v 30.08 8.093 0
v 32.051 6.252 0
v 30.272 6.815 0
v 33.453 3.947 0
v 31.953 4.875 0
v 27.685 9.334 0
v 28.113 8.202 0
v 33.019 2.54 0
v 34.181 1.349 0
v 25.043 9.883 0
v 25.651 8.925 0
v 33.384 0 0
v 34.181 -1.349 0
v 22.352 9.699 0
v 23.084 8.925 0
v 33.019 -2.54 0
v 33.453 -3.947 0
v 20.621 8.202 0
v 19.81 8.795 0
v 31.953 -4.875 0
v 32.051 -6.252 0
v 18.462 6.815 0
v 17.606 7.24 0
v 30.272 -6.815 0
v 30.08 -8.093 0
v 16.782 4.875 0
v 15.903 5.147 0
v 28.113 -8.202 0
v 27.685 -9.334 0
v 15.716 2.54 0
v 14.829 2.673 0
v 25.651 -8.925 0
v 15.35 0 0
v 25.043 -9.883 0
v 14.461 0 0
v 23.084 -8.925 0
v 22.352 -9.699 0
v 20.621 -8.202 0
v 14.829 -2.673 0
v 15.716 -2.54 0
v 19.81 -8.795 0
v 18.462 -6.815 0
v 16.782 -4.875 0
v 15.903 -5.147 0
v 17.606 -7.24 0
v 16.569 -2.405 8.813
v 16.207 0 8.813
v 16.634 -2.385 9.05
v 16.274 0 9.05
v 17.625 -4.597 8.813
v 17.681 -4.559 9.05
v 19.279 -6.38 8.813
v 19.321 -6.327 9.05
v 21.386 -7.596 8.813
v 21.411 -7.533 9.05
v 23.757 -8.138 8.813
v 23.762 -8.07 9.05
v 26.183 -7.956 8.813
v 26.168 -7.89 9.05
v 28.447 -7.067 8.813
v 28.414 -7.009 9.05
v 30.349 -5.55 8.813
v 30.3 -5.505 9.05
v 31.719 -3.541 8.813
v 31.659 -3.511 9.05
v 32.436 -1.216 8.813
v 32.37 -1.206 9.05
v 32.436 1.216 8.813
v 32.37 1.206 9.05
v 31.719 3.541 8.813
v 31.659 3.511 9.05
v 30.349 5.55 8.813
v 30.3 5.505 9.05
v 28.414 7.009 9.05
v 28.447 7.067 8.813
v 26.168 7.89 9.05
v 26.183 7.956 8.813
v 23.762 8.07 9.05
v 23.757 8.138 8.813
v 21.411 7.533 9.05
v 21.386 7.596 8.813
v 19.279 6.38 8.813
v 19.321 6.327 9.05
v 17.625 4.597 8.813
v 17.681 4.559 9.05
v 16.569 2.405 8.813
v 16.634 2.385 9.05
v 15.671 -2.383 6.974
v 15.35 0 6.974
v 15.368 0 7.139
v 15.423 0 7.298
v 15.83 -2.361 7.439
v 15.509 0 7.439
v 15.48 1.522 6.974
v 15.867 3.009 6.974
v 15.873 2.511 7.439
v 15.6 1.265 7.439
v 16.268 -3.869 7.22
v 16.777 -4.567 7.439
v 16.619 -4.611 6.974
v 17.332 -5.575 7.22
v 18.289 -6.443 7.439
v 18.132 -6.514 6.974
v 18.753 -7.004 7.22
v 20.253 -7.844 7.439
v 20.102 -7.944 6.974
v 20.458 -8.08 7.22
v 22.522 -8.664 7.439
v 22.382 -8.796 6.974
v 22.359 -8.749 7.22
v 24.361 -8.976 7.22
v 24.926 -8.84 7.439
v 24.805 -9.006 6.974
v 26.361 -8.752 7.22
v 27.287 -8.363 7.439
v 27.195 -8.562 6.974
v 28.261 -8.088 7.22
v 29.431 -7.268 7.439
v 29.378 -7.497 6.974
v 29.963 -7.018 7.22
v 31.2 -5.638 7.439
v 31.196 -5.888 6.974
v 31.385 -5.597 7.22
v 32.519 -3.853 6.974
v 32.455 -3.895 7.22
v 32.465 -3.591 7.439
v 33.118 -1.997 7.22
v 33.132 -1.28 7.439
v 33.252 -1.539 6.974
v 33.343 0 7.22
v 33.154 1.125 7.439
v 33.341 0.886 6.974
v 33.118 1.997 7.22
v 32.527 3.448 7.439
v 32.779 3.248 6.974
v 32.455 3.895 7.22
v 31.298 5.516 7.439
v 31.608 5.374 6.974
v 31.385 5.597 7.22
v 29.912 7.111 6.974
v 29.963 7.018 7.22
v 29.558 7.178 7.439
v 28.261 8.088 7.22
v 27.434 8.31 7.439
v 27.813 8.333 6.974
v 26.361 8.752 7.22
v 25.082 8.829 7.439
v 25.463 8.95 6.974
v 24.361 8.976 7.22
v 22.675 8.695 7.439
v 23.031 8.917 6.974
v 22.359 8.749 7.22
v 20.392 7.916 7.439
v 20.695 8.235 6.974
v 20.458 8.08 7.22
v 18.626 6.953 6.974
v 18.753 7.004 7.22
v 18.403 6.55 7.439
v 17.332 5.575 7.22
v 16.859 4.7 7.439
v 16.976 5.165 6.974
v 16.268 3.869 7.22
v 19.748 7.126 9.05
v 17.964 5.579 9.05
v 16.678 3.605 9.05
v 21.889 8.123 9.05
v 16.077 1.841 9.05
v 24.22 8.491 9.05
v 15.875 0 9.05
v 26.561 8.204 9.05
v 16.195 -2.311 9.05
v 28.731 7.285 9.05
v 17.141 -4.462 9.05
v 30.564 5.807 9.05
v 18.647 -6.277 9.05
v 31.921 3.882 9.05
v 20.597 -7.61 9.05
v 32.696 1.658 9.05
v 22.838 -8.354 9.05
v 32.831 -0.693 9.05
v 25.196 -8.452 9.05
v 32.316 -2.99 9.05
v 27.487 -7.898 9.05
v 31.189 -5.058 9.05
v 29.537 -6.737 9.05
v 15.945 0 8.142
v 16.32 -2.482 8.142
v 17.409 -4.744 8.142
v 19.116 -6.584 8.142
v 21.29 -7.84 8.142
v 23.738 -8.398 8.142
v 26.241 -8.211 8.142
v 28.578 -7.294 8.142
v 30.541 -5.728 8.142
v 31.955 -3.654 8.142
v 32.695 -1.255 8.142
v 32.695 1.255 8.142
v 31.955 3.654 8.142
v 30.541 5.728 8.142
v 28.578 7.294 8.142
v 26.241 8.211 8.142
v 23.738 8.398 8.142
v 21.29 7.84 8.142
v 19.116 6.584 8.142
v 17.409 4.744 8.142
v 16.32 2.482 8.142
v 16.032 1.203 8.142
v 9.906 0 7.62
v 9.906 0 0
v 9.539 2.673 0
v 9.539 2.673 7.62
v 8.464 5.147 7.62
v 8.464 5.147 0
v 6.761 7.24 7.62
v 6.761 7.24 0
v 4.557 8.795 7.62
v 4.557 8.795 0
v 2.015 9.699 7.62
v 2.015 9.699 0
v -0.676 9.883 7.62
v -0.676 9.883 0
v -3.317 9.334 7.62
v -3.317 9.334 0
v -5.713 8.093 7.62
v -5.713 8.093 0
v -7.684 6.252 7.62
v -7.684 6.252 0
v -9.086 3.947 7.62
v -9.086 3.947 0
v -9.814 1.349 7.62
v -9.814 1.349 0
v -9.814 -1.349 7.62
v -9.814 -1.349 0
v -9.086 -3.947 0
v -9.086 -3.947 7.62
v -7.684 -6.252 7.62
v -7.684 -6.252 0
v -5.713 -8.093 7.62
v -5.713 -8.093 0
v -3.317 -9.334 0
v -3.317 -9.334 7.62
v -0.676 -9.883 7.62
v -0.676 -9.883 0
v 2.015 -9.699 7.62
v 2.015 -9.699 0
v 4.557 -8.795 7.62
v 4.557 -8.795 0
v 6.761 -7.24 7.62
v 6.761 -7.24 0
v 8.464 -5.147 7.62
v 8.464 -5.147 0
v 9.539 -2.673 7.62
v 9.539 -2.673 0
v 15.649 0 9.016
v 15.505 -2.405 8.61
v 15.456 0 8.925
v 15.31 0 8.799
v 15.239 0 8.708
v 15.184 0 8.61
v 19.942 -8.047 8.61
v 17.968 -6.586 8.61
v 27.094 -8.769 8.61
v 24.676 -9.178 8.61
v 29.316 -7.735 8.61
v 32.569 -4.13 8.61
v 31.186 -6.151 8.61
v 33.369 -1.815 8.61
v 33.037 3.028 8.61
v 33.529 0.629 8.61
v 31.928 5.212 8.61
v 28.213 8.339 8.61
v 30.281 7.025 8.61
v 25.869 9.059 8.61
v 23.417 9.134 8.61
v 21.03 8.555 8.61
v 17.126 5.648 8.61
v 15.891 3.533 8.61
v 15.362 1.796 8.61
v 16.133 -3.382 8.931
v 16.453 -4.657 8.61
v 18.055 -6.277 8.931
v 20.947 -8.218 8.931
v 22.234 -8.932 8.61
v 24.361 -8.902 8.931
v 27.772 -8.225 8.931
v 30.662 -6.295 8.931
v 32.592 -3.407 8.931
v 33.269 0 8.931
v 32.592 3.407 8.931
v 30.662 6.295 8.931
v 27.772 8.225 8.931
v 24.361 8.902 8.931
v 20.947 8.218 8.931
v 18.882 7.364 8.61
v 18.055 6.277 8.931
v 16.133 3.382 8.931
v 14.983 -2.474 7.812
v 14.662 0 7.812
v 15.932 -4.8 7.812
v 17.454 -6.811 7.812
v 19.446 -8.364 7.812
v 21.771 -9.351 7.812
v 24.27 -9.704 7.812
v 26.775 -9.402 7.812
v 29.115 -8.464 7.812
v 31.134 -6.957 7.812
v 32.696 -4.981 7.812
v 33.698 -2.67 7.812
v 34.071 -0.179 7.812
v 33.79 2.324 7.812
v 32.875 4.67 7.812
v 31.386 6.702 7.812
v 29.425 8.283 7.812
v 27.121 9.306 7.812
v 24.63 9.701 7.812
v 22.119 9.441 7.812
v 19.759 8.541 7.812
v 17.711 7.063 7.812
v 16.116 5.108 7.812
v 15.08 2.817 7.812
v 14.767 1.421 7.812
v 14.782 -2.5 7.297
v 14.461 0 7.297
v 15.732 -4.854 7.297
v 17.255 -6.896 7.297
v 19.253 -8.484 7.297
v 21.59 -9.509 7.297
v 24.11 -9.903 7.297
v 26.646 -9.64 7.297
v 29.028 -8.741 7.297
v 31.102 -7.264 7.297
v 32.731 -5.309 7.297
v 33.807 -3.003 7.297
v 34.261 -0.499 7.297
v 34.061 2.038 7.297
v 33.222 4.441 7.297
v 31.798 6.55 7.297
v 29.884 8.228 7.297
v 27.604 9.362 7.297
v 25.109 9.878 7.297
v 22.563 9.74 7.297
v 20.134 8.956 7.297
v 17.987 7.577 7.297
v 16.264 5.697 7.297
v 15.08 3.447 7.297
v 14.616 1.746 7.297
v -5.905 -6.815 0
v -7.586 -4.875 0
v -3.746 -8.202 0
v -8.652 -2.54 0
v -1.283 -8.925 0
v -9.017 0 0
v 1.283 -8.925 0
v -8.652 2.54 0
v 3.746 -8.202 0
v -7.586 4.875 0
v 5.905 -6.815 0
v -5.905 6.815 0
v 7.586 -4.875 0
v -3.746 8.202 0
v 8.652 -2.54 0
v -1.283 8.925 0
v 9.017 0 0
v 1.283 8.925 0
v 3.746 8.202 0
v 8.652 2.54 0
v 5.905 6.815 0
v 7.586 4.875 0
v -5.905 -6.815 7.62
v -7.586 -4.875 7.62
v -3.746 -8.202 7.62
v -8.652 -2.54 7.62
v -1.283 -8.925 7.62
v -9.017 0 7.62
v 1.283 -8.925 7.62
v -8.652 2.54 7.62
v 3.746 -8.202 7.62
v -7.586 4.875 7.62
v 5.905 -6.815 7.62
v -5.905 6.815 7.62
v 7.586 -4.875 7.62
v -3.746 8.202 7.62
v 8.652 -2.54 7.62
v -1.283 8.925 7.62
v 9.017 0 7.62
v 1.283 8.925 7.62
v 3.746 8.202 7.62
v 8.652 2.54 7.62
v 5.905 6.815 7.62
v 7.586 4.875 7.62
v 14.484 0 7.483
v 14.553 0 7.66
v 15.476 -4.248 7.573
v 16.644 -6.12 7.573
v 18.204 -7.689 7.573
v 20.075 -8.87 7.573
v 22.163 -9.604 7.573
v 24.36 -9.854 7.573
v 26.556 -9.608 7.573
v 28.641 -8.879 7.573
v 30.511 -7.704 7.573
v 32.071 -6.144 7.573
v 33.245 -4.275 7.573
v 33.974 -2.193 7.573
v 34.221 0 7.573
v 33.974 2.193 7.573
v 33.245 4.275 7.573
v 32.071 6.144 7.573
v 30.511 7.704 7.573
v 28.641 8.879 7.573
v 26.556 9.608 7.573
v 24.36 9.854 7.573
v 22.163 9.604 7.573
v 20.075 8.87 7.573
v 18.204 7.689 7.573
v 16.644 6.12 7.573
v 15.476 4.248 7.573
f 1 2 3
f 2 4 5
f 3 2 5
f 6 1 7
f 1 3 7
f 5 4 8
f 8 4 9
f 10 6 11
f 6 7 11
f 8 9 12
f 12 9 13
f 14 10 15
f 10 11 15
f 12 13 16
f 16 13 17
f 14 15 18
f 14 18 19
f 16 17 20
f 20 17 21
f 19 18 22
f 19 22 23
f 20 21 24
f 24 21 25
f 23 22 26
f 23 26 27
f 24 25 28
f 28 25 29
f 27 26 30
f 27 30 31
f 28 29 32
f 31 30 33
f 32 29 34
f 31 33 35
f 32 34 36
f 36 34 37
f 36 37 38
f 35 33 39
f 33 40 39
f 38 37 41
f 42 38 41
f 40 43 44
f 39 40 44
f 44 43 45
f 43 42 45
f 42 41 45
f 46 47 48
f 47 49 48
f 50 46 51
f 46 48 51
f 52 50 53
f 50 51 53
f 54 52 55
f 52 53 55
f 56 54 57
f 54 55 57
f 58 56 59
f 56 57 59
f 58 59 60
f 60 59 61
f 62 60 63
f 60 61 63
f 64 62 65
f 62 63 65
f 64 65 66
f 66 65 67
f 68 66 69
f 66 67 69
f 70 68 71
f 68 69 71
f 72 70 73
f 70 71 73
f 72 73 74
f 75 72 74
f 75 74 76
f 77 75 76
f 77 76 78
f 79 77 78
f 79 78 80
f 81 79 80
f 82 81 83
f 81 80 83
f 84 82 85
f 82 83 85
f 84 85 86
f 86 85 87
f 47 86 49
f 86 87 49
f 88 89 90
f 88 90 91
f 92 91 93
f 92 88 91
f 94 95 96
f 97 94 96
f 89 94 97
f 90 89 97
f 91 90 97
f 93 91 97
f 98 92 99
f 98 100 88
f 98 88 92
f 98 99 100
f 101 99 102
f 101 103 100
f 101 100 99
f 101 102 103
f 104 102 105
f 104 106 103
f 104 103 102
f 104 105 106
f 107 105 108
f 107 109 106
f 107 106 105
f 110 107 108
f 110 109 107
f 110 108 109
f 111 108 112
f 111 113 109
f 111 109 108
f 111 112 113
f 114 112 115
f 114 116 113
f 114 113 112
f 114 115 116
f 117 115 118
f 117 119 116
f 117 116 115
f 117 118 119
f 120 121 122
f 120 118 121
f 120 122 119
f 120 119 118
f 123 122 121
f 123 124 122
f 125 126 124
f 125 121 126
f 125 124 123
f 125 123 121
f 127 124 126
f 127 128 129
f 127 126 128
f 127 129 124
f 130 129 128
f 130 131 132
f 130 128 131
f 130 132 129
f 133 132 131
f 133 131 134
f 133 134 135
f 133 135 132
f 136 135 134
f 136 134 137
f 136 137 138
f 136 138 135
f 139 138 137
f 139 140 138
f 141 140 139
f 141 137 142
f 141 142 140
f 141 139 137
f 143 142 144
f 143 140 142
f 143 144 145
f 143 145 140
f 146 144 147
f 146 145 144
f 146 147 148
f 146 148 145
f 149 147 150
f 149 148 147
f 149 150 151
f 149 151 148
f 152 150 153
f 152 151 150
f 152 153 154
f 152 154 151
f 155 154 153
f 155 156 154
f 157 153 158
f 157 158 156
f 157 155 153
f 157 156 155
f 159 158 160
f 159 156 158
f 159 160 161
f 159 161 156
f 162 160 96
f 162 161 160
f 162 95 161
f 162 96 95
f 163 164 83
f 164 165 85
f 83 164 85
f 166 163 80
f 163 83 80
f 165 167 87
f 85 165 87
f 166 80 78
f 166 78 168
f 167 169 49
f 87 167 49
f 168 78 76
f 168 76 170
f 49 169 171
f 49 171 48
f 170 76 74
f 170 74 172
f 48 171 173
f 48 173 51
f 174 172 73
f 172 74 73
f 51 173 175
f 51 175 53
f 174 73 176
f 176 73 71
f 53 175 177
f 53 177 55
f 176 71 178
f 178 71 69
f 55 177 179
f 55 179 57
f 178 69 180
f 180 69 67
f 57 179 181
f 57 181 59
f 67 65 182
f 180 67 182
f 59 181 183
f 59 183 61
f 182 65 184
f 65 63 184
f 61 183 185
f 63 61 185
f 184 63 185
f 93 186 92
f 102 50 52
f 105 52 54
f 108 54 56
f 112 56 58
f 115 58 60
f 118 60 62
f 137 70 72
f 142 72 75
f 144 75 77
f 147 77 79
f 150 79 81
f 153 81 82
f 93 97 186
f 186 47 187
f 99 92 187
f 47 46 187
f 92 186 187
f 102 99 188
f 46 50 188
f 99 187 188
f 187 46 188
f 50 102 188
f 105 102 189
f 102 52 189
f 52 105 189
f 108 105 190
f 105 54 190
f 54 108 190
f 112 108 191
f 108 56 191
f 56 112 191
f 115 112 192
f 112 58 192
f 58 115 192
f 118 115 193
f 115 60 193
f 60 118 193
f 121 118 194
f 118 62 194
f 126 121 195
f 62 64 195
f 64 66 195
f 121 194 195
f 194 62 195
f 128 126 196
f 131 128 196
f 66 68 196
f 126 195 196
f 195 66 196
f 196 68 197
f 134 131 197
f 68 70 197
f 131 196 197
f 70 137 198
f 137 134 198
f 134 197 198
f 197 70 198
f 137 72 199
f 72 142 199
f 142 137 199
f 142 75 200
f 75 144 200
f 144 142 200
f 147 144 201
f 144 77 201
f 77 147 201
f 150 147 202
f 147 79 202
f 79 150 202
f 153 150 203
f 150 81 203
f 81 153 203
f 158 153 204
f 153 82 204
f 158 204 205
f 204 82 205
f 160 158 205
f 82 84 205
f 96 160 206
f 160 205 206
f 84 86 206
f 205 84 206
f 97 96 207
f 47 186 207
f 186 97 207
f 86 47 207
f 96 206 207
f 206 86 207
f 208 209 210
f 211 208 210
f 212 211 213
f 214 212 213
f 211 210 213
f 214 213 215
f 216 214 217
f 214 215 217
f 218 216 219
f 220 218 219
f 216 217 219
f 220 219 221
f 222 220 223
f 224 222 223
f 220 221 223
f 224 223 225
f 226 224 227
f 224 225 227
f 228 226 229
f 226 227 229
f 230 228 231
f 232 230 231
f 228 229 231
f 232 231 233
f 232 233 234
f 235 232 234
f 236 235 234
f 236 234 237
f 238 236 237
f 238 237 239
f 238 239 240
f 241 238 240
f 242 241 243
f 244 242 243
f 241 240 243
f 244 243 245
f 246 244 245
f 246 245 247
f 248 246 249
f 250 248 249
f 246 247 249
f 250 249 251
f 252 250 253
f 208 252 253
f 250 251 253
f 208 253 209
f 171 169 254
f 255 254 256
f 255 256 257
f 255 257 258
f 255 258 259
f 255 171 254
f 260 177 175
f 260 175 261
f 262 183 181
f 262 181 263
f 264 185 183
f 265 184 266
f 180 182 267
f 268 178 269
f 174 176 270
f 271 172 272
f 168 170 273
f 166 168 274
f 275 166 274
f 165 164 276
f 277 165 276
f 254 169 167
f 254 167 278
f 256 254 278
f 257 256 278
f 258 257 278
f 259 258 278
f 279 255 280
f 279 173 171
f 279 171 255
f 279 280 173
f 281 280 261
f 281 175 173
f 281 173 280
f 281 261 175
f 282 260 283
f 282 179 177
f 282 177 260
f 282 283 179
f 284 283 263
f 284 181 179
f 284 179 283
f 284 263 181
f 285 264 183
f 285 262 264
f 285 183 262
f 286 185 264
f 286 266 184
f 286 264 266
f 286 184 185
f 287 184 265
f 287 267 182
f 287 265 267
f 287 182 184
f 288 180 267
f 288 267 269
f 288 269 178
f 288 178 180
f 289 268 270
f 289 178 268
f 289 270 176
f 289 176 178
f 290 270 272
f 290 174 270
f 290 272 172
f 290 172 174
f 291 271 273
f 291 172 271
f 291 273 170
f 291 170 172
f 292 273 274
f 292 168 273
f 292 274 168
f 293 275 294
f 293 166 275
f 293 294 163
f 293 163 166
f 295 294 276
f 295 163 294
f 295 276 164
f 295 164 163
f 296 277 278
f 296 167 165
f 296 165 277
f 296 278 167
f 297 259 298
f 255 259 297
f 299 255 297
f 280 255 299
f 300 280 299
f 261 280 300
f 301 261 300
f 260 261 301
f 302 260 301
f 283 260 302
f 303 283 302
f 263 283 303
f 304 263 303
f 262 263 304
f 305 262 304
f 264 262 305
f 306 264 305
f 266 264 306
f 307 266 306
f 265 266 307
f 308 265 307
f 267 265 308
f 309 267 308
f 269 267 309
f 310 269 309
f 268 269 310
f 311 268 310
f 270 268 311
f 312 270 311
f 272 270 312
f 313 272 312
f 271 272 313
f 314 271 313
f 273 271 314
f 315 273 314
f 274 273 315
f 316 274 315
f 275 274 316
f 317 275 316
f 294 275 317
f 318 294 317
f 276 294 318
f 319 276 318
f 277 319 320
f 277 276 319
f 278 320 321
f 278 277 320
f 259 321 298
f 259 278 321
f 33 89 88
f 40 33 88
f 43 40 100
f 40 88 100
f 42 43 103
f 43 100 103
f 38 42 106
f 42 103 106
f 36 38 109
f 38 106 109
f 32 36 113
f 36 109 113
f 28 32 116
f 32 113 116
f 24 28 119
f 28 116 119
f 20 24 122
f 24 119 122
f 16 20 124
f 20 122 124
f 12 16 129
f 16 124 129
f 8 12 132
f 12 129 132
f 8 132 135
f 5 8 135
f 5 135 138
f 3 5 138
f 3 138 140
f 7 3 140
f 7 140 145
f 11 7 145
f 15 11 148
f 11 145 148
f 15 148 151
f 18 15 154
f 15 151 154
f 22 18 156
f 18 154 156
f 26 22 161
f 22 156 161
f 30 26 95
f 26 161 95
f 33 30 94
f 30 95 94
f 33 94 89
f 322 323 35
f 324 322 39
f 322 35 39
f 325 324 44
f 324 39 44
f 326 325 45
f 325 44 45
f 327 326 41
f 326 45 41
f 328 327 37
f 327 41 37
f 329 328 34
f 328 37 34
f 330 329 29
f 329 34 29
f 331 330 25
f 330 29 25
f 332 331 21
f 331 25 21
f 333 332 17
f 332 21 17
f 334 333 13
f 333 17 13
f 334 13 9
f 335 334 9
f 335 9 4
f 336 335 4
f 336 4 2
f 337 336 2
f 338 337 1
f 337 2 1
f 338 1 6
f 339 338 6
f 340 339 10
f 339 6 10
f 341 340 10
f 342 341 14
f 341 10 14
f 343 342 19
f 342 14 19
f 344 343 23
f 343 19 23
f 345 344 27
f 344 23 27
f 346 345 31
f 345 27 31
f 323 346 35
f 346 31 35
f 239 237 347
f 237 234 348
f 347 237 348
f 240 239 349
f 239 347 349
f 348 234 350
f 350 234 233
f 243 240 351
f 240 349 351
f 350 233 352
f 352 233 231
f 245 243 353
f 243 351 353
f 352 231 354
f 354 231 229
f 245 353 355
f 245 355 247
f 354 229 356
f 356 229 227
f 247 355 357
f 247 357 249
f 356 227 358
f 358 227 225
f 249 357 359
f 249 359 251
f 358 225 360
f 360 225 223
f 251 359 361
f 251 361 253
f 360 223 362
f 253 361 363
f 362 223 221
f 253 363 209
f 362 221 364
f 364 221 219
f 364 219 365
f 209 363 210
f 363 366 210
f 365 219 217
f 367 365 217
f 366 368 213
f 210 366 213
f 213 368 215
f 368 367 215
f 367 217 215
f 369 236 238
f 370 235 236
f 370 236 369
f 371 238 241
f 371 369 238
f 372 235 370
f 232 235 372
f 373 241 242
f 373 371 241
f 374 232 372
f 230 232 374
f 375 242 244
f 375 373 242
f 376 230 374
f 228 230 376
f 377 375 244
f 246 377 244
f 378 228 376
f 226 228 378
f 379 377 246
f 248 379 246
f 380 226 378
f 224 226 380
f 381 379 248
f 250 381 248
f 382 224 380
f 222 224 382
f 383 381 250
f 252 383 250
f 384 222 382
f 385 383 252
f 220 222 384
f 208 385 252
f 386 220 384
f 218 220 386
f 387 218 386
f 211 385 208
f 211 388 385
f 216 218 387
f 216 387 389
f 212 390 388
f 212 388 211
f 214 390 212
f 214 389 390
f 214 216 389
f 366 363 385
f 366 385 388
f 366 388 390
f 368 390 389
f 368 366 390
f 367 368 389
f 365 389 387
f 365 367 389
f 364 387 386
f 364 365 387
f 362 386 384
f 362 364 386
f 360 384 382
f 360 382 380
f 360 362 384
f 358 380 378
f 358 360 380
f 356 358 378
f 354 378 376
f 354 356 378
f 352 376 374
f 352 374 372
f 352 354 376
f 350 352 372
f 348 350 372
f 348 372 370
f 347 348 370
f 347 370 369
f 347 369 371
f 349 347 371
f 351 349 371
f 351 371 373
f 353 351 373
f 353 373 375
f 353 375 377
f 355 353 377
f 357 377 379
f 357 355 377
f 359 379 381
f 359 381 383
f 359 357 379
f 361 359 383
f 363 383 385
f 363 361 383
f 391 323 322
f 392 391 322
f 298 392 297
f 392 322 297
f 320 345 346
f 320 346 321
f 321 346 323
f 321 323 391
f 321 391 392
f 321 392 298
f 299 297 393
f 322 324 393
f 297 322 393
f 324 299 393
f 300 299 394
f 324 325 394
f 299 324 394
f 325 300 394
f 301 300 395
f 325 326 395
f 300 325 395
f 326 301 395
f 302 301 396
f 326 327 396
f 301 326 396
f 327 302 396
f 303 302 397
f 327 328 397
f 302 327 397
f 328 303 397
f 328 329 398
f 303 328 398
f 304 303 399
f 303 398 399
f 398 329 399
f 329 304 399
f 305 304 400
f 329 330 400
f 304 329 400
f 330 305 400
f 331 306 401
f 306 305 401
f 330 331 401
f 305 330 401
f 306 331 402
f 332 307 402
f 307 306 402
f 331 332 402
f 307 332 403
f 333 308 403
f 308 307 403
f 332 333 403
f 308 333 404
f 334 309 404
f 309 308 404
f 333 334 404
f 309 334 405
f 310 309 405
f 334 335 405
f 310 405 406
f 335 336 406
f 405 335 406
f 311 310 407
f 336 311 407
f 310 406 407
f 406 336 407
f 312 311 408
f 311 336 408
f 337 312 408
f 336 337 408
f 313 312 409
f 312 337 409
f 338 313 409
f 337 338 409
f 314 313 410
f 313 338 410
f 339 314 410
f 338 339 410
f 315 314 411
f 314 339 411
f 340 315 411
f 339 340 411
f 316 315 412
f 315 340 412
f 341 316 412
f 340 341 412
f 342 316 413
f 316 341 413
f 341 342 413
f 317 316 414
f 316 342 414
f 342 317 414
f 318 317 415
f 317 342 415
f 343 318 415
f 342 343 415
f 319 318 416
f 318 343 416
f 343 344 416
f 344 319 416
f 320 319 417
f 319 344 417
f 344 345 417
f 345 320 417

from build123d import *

# Parameters (mm, degrees)
F0_R     = 9.906
F0_R_2   = 9.017
F1_DEPTH = 7.62
F4_R     = 0.762


# Not quite as in the source:
# - ends of sketch curves that miss each other by under 0.0002 mm in the source are joined


with BuildPart() as f1:
    # F0 (on Top) → F1 (new body)
    with BuildSketch(Plane.XY):
        Circle(F0_R)
        Circle(F0_R_2, mode=Mode.SUBTRACT)
    extrude(amount=F1_DEPTH)


with BuildPart() as f3:
    # F2 (on Front) → F3 (revolve)
    with BuildSketch(Plane.XZ):
        with BuildLine():
            Line((14.4612686709, 7.62), (14.4612686709, 0))
            Line((14.4612686709, 0), (15.3502686709, 0))
            Line((15.3502686709, 0), (15.3502686709, 7.2476301639))
            add(Edge.make_bspline(
                [(15.3502686709, 7.2476301639), (15.3919398222, 7.2943099028), (15.563906281, 7.4988239117), (15.8154492473, 7.8746040023), (16.057110979, 8.3604725059), (16.165645556, 8.6639414702), (16.2069450038, 8.812884039)],
                knots=[0.1746961563, 0.1746961563, 0.1746961563, 0.1746961563, 0.25, 0.5, 0.75, 1, 1, 1, 1], degree=3))
            Line((16.2069450038, 8.812884039), (16.274407506, 9.0504270047))
            Line((16.274407506, 9.0504270047), (15.3502686709, 9.0504270047))
            add(Edge.make_bspline(
                [(14.4612686709, 7.62), (14.9159906432, 7.9980511218), (15.2358394116, 8.6377486587), (15.3502686709, 9.0504270047)],
                knots=[0, 0, 0, 0, 1.6841741049, 1.6841741049, 1.6841741049, 1.6841741049], degree=3))
        make_face()
    revolve(axis=Axis((24.3672686709, 0, 3.81), (0, 0, 1)))

    # F4
    f4_edges = [f3.edges().sort_by_distance(p)[0] for p in [
        (34.273269, 0, 7.62),
        (33.384269, 0, 9.050427),
        (33.384269, 0, 7.24763),
    ]]
    fillet(f4_edges, radius=F4_R)


solid = Compound([f1.part, f3.part])
